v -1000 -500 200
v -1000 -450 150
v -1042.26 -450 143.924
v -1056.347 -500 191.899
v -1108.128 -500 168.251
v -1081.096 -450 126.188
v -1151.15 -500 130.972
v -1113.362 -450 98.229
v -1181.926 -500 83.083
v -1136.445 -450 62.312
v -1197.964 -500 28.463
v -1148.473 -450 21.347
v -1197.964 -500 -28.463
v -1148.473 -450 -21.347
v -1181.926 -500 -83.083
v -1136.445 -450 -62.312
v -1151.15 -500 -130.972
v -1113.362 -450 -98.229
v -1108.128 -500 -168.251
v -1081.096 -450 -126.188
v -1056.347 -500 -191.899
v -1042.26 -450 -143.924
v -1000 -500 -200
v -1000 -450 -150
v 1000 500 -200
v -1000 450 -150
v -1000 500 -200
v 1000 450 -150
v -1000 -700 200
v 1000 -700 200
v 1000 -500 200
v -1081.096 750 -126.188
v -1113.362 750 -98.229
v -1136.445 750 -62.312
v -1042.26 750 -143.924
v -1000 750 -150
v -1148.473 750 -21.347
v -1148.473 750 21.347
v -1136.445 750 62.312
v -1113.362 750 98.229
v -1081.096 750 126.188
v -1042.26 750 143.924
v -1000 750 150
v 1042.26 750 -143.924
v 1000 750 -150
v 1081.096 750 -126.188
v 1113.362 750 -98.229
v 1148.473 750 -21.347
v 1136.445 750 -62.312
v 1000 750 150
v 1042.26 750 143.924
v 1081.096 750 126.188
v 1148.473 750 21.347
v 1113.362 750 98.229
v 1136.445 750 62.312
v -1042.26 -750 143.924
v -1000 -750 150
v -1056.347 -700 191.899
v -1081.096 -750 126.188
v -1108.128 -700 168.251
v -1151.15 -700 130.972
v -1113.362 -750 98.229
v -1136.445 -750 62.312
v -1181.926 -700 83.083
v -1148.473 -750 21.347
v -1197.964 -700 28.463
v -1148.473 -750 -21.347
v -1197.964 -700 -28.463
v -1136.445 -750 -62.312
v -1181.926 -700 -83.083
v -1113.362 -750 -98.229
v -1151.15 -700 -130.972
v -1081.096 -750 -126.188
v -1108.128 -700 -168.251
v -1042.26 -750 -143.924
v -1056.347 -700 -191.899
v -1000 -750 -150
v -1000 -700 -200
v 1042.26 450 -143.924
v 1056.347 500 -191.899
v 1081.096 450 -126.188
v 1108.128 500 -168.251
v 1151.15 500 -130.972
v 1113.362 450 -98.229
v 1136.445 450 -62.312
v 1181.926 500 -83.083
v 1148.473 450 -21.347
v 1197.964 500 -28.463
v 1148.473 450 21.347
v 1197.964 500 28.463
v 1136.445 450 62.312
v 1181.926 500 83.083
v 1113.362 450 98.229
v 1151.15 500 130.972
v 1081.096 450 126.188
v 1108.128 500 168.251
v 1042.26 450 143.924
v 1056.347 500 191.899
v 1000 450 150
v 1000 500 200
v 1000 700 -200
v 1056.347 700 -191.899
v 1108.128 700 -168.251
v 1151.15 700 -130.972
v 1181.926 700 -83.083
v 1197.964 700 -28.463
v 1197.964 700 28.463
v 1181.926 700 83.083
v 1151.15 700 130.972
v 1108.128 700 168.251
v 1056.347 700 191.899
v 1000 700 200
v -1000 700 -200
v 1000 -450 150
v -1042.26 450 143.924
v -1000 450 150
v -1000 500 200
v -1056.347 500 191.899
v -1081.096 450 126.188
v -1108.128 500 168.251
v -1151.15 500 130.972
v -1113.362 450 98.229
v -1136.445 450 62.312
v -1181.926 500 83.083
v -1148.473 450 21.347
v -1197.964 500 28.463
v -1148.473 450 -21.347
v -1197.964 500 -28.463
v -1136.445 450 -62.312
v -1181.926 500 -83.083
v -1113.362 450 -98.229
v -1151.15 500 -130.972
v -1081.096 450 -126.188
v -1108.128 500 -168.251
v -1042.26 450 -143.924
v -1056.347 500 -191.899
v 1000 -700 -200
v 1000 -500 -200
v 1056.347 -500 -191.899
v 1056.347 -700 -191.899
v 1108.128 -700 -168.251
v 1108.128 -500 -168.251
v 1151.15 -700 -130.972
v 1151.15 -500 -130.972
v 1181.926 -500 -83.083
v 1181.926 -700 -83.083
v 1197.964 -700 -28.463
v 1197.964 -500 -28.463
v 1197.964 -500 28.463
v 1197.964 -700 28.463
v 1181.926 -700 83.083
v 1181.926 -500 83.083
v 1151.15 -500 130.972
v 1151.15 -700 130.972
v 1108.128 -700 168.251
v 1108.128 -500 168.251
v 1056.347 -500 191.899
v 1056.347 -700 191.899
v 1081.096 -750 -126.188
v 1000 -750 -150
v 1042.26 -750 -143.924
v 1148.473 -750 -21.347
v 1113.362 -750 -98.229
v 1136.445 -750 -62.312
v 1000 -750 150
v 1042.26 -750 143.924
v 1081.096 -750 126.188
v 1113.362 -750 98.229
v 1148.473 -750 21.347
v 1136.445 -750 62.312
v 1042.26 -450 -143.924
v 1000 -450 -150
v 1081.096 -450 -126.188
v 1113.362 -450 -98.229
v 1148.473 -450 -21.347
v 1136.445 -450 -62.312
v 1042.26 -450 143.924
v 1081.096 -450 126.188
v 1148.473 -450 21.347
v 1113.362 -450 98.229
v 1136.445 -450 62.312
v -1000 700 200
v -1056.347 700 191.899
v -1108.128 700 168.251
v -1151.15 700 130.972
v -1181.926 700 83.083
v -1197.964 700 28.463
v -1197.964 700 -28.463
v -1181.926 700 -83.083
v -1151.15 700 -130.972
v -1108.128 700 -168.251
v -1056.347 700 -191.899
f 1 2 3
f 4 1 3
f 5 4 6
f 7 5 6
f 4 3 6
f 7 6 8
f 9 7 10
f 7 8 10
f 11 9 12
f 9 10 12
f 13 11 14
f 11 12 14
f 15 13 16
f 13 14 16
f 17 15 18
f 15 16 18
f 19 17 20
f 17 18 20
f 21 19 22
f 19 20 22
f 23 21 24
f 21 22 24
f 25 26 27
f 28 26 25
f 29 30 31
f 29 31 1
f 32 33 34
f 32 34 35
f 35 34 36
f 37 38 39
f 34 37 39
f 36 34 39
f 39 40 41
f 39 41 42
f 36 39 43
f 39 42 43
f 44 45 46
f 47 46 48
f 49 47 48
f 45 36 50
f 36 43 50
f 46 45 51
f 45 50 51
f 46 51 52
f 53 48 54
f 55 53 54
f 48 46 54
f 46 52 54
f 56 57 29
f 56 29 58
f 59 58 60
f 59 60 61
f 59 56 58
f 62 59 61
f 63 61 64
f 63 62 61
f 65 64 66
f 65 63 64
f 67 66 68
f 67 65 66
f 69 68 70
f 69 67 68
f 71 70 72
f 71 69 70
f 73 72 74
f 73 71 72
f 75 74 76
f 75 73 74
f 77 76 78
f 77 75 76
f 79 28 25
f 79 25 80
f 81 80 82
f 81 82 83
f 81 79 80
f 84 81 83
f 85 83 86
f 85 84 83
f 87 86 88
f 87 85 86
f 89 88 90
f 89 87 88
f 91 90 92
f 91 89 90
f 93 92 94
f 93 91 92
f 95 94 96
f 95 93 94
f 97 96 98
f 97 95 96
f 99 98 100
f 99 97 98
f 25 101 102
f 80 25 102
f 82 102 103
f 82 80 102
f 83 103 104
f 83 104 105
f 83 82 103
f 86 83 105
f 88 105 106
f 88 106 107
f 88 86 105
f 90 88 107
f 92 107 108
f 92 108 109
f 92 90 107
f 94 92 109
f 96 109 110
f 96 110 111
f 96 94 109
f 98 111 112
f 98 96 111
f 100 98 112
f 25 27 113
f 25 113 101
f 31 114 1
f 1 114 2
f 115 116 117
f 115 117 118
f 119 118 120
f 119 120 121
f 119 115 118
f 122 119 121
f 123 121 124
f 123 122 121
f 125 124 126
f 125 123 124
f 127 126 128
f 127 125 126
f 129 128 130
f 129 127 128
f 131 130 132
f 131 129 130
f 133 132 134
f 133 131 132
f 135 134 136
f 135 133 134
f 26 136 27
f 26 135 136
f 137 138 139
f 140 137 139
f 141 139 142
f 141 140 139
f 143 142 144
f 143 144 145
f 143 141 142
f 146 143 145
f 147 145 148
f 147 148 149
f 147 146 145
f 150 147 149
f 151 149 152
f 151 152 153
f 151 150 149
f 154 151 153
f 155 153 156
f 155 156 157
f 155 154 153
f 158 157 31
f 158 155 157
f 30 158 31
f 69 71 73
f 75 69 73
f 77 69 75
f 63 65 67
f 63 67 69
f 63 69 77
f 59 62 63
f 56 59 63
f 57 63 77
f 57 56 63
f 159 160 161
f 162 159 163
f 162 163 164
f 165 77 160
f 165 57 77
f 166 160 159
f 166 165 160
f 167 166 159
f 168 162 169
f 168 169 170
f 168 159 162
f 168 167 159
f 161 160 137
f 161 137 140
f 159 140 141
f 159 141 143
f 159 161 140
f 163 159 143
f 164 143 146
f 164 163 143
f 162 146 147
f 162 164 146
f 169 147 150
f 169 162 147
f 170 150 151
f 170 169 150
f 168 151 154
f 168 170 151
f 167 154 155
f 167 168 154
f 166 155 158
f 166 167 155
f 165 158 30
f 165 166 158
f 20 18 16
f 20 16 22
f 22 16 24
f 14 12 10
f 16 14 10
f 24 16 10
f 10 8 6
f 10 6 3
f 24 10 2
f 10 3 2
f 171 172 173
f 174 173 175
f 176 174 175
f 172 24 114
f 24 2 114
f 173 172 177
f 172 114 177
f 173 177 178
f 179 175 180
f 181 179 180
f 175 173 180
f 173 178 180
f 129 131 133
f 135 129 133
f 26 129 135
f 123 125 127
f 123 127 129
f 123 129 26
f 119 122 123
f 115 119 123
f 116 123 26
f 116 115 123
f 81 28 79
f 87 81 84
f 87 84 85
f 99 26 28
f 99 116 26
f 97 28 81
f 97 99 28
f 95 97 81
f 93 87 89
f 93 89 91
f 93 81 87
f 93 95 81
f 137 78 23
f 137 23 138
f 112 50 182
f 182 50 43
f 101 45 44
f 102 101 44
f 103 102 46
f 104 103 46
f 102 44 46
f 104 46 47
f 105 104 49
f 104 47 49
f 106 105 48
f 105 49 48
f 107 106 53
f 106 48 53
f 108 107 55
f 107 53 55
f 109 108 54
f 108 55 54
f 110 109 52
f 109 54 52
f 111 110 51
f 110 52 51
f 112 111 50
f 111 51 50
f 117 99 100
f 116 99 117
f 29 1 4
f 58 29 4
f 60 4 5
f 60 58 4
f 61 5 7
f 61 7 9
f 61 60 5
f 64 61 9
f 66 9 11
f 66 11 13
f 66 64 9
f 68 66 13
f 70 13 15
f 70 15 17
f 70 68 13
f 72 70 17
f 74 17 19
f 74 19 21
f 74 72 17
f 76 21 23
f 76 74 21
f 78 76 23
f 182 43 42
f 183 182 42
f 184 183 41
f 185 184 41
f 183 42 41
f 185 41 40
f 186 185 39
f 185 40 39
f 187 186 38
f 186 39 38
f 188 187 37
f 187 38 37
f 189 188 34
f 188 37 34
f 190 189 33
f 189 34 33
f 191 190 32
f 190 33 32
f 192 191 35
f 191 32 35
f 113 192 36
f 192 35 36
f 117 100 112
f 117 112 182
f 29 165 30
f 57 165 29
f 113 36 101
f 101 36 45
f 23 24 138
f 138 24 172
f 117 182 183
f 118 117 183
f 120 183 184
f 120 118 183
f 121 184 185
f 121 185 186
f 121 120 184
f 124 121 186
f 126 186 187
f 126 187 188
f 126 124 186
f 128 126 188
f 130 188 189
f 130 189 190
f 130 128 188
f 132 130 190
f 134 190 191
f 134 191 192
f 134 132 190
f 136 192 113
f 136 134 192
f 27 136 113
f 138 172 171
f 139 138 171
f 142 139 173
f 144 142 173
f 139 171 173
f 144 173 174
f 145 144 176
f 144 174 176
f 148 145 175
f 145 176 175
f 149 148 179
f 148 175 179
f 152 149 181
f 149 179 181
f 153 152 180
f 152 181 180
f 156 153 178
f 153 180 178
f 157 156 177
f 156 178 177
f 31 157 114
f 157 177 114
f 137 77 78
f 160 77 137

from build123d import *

# Parameters (mm, degrees)
F1_DEPTH = 750
F2_DEPTH = 450
F3_SIZE  = 50


with BuildPart() as f1:
    # F0 (on Front) → F1 (new body, symmetric)
    with BuildSketch(Plane.XZ):
        with BuildLine():
            Line((1000, 200), (-1000, 200))
            ThreePointArc((-1000, 200), (-1200, 0), (-1000, -200))
            Line((-1000, -200), (1000, -200))
            ThreePointArc((1000, -200), (1200, 0), (1000, 200))
        make_face()
    extrude(amount=F1_DEPTH, both=True)

    # F0 (on Front) → F2 (cut, symmetric)
    with BuildSketch(Plane.XZ):
        with BuildLine():
            Line((1000, 200), (-1000, 200))
            ThreePointArc((-1000, 200), (-1200, 0), (-1000, -200))
            Line((-1000, -200), (1000, -200))
            ThreePointArc((1000, -200), (1200, 0), (1000, 200))
        make_face()
    extrude(amount=F2_DEPTH, both=True, mode=Mode.SUBTRACT)

    # F3
    f3_edges = [f1.edges().sort_by_distance(p)[0] for p in [
        (0, -750, 200),
        (-1200, -750, 0),
        (0, -750, -200),
        (1200, -750, 0),
        (0, 450, 200),
        (0, 750, 200),
        (0, -450, 200),
    ]]
    chamfer(f3_edges, length=F3_SIZE)


solid = f1.part
